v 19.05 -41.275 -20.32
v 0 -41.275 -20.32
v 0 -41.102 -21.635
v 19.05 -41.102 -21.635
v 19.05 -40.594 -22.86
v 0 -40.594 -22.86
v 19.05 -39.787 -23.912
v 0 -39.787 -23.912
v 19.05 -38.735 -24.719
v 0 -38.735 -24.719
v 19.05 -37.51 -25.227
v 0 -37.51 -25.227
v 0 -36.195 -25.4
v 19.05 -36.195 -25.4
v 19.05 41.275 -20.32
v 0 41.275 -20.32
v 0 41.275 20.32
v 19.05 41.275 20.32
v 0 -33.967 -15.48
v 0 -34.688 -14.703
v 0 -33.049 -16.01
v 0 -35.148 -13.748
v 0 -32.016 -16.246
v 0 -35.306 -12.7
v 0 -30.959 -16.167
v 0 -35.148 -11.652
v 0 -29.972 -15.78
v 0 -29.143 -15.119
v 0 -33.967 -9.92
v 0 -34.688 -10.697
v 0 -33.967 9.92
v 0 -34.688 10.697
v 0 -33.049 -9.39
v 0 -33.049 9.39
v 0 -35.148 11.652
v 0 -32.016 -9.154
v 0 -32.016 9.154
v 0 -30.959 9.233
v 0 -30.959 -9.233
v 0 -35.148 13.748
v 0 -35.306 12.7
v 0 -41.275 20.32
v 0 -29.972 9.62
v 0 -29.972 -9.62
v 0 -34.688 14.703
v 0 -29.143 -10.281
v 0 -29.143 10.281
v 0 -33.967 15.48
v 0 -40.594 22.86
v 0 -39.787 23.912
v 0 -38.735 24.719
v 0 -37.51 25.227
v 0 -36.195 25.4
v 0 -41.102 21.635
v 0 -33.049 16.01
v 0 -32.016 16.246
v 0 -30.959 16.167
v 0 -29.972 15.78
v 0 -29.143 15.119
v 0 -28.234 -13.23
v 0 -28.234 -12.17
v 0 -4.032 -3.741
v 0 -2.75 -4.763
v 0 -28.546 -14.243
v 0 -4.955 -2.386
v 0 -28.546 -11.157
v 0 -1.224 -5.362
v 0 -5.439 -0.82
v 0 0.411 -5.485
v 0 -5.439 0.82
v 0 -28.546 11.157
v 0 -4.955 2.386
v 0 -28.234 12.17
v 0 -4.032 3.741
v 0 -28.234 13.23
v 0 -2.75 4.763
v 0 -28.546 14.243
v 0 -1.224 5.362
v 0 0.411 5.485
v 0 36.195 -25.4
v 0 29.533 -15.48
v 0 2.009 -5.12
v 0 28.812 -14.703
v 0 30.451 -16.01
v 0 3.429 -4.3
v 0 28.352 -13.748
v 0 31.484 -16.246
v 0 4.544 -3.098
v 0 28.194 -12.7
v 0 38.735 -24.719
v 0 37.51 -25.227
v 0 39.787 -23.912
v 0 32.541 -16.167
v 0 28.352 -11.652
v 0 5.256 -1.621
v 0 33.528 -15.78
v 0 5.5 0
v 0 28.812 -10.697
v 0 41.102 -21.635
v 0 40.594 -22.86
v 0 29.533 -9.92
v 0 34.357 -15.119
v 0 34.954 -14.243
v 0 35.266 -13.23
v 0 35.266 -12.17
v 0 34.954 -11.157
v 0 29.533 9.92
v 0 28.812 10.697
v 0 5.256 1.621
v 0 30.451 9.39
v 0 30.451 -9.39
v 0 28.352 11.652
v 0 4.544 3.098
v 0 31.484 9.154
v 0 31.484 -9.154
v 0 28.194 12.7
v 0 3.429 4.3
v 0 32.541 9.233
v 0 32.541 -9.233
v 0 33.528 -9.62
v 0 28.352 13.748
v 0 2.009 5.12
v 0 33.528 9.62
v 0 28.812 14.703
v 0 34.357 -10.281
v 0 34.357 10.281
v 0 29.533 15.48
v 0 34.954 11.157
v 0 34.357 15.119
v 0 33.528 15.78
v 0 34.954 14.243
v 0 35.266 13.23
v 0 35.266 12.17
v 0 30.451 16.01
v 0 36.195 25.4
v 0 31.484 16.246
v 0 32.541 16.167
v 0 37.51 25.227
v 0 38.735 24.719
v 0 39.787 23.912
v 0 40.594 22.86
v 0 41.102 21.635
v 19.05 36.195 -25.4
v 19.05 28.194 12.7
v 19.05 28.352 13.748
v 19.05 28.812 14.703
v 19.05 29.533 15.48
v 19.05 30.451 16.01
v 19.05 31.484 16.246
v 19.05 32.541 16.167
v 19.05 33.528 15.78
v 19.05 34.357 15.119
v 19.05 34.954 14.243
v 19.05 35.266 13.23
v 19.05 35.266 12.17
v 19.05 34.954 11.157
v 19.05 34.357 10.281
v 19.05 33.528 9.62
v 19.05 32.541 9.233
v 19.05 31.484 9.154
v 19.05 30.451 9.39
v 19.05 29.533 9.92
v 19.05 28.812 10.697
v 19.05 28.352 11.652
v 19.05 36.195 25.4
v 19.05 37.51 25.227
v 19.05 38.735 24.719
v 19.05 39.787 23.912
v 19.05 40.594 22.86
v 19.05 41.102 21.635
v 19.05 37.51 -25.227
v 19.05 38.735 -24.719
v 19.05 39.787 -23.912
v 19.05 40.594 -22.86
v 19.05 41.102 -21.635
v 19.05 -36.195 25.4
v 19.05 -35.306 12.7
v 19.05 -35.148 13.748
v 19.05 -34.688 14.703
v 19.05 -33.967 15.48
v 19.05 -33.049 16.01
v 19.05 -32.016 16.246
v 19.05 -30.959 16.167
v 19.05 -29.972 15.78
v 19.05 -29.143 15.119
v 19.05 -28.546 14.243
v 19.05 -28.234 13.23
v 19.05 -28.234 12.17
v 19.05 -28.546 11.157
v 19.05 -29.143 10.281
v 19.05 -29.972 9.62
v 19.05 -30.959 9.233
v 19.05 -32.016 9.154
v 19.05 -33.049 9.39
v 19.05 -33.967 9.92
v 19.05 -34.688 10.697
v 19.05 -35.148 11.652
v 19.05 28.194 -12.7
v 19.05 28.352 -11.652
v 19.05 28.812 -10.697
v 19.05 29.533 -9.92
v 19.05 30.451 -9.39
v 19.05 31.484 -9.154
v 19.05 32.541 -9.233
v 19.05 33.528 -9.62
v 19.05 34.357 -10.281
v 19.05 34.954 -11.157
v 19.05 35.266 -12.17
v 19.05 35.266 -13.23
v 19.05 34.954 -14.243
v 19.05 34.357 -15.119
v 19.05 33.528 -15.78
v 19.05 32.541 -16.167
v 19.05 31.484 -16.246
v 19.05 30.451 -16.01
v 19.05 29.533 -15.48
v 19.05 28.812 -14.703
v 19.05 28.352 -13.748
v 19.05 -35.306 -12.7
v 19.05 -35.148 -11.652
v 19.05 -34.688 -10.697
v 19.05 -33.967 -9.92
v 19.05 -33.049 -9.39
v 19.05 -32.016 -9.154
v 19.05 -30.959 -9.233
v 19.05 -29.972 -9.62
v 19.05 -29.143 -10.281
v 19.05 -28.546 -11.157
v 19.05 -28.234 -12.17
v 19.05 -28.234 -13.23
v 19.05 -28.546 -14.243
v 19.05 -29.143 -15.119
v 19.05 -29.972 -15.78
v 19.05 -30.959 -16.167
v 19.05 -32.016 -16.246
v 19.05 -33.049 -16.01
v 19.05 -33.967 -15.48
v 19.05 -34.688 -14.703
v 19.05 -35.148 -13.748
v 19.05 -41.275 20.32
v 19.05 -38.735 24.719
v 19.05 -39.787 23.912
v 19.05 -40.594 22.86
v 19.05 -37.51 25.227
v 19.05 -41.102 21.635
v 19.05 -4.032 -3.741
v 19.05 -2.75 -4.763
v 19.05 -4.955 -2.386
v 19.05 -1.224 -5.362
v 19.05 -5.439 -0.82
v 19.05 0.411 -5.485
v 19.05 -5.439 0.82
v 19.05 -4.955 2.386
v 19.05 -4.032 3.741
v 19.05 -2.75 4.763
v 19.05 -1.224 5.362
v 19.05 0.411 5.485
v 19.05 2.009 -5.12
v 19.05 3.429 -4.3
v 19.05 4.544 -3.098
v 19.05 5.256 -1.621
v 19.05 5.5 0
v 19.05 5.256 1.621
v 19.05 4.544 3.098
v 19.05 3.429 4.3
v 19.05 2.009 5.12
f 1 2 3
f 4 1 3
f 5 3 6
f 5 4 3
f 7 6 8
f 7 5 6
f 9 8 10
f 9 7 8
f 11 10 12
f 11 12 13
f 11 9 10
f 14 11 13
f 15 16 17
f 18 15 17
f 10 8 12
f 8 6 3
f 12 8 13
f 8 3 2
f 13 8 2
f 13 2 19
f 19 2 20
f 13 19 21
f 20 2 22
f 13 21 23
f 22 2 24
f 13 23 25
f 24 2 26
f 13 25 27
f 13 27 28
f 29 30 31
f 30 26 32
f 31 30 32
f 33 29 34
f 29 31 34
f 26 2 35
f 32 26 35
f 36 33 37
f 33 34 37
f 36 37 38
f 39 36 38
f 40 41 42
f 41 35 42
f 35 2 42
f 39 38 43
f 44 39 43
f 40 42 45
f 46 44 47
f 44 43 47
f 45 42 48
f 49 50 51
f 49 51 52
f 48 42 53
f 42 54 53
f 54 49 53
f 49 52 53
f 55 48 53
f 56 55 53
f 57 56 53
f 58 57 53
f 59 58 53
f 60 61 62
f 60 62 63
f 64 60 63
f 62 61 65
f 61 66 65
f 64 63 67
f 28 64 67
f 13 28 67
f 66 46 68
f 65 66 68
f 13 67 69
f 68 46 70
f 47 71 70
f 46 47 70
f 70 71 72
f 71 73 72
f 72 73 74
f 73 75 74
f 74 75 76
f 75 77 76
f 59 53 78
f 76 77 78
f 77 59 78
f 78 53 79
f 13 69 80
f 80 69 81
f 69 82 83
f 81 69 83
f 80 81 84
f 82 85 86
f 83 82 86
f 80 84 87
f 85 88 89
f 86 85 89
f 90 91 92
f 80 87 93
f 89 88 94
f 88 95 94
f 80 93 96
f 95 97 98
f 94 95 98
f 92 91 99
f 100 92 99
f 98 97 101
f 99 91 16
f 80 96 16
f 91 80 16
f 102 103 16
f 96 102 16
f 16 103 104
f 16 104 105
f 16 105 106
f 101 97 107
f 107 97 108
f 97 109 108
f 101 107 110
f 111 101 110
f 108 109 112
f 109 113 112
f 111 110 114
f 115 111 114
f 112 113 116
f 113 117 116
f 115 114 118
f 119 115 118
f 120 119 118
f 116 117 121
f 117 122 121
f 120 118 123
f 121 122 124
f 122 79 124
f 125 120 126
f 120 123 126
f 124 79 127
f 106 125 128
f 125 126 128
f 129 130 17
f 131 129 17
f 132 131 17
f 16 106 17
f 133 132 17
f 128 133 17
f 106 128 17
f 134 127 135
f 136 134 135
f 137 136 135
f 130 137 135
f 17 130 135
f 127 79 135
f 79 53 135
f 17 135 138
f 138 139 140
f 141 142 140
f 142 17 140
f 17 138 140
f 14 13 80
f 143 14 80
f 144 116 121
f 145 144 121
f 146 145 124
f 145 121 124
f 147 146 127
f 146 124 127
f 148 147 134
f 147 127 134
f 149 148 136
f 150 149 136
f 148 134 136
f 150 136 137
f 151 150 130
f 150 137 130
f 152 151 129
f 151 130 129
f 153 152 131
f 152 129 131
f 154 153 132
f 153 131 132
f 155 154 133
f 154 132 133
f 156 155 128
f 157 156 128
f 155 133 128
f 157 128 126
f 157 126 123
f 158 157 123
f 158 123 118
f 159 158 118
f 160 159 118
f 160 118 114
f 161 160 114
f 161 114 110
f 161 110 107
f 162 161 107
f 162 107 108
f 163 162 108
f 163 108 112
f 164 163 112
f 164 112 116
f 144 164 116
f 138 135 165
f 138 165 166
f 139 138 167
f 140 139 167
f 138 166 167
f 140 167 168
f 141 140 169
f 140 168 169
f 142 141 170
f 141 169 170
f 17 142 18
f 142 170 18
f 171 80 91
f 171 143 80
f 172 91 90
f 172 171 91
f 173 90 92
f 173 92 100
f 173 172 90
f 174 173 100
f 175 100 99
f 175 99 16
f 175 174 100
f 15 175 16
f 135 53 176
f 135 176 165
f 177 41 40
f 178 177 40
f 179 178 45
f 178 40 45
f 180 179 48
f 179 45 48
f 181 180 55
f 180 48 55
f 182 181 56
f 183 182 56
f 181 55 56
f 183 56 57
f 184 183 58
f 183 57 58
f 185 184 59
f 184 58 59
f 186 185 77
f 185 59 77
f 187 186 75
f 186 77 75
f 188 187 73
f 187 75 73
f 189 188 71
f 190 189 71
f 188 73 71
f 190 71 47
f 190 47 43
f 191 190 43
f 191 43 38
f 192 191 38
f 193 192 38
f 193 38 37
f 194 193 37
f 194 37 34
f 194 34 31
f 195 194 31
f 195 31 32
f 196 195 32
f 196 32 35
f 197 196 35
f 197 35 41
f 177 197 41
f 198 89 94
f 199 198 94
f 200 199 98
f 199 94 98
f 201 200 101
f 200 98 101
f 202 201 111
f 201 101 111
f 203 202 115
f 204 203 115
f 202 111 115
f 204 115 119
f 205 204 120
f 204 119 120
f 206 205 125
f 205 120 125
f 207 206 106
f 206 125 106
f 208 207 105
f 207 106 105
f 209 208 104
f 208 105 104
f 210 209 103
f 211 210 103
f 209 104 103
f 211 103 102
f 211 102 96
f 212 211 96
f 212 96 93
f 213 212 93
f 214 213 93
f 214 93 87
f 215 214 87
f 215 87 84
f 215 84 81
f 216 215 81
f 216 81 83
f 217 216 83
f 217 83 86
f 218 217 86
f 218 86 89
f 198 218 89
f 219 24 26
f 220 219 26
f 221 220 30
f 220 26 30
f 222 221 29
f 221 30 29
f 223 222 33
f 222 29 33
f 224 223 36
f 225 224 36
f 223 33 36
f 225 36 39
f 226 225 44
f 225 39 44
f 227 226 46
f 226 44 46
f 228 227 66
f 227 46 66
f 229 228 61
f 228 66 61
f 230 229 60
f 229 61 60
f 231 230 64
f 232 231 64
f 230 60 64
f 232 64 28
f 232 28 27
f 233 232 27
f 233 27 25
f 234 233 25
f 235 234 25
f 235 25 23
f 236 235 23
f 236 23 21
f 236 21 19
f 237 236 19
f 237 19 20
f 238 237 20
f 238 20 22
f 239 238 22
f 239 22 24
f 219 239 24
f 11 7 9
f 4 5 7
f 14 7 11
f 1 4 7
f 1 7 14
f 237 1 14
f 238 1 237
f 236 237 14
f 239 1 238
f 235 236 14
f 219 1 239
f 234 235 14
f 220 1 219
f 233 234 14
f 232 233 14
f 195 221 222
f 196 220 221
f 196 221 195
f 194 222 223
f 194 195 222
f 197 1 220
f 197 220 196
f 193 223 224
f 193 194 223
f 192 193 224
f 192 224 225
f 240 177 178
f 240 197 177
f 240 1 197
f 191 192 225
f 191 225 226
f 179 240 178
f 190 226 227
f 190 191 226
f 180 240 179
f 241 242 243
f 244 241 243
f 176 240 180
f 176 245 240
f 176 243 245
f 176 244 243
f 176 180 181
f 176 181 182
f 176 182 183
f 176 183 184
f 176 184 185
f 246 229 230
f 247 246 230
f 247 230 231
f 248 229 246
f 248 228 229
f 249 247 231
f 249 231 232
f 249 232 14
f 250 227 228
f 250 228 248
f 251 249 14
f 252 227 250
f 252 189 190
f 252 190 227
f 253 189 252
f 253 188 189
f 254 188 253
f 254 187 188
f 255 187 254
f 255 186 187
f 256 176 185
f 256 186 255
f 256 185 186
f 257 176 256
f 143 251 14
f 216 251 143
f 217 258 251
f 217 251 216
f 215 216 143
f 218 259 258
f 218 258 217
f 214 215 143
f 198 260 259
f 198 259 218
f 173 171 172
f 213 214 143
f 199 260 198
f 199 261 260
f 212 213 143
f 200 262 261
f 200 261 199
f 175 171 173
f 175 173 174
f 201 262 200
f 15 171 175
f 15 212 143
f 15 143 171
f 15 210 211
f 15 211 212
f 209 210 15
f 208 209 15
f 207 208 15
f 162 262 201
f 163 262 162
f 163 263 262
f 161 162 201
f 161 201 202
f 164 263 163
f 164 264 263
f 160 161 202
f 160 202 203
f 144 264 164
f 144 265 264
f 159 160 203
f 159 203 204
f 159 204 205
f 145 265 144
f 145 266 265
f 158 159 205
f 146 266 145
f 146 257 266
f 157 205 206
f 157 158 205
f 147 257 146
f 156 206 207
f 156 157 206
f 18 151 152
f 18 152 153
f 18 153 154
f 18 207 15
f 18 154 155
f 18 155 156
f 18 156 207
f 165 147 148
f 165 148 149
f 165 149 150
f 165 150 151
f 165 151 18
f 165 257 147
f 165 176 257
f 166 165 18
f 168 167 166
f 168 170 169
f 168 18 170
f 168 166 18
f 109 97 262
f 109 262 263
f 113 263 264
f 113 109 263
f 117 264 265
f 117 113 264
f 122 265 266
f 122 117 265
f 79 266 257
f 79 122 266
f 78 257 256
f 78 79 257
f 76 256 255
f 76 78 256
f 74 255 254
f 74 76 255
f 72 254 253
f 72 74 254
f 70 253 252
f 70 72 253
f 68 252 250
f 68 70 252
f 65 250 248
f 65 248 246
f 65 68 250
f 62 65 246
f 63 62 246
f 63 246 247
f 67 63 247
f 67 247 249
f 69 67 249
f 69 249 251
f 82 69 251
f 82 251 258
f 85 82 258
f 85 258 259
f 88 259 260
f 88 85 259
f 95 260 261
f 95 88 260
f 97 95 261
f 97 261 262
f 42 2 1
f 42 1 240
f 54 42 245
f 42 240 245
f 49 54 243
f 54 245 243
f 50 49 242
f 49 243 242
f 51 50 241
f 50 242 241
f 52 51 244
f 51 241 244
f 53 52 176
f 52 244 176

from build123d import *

# Parameters (mm, degrees)
F0_W     = 82.55
F0_H     = 50.8
F0_R     = 5.5
F1_DEPTH = 19.05
F3_D     = 7.112
F4_R     = 5.08


with BuildPart() as f1:
    # F0 (on Right) → F1 (new body)
    with BuildSketch(Plane.YZ):
        Rectangle(F0_W, F0_H)
        Circle(F0_R, mode=Mode.SUBTRACT)
    extrude(amount=F1_DEPTH)

    # F3 (through all)
    with Locations(Plane.YZ.offset(19.05)):
        with Locations((-31.75, 12.7), (31.75, 12.7), (31.75, -12.7), (-31.75, -12.7)):
            Hole(F3_D / 2)

    # F4
    f4_edges = [f1.edges().sort_by_distance(p)[0] for p in [
        (9.525, -41.275, 25.4),
        (9.525, -41.275, -25.4),
        (9.525, 41.275, -25.4),
        (9.525, 41.275, 25.4),
    ]]
    fillet(f4_edges, radius=F4_R)


solid = f1.part
